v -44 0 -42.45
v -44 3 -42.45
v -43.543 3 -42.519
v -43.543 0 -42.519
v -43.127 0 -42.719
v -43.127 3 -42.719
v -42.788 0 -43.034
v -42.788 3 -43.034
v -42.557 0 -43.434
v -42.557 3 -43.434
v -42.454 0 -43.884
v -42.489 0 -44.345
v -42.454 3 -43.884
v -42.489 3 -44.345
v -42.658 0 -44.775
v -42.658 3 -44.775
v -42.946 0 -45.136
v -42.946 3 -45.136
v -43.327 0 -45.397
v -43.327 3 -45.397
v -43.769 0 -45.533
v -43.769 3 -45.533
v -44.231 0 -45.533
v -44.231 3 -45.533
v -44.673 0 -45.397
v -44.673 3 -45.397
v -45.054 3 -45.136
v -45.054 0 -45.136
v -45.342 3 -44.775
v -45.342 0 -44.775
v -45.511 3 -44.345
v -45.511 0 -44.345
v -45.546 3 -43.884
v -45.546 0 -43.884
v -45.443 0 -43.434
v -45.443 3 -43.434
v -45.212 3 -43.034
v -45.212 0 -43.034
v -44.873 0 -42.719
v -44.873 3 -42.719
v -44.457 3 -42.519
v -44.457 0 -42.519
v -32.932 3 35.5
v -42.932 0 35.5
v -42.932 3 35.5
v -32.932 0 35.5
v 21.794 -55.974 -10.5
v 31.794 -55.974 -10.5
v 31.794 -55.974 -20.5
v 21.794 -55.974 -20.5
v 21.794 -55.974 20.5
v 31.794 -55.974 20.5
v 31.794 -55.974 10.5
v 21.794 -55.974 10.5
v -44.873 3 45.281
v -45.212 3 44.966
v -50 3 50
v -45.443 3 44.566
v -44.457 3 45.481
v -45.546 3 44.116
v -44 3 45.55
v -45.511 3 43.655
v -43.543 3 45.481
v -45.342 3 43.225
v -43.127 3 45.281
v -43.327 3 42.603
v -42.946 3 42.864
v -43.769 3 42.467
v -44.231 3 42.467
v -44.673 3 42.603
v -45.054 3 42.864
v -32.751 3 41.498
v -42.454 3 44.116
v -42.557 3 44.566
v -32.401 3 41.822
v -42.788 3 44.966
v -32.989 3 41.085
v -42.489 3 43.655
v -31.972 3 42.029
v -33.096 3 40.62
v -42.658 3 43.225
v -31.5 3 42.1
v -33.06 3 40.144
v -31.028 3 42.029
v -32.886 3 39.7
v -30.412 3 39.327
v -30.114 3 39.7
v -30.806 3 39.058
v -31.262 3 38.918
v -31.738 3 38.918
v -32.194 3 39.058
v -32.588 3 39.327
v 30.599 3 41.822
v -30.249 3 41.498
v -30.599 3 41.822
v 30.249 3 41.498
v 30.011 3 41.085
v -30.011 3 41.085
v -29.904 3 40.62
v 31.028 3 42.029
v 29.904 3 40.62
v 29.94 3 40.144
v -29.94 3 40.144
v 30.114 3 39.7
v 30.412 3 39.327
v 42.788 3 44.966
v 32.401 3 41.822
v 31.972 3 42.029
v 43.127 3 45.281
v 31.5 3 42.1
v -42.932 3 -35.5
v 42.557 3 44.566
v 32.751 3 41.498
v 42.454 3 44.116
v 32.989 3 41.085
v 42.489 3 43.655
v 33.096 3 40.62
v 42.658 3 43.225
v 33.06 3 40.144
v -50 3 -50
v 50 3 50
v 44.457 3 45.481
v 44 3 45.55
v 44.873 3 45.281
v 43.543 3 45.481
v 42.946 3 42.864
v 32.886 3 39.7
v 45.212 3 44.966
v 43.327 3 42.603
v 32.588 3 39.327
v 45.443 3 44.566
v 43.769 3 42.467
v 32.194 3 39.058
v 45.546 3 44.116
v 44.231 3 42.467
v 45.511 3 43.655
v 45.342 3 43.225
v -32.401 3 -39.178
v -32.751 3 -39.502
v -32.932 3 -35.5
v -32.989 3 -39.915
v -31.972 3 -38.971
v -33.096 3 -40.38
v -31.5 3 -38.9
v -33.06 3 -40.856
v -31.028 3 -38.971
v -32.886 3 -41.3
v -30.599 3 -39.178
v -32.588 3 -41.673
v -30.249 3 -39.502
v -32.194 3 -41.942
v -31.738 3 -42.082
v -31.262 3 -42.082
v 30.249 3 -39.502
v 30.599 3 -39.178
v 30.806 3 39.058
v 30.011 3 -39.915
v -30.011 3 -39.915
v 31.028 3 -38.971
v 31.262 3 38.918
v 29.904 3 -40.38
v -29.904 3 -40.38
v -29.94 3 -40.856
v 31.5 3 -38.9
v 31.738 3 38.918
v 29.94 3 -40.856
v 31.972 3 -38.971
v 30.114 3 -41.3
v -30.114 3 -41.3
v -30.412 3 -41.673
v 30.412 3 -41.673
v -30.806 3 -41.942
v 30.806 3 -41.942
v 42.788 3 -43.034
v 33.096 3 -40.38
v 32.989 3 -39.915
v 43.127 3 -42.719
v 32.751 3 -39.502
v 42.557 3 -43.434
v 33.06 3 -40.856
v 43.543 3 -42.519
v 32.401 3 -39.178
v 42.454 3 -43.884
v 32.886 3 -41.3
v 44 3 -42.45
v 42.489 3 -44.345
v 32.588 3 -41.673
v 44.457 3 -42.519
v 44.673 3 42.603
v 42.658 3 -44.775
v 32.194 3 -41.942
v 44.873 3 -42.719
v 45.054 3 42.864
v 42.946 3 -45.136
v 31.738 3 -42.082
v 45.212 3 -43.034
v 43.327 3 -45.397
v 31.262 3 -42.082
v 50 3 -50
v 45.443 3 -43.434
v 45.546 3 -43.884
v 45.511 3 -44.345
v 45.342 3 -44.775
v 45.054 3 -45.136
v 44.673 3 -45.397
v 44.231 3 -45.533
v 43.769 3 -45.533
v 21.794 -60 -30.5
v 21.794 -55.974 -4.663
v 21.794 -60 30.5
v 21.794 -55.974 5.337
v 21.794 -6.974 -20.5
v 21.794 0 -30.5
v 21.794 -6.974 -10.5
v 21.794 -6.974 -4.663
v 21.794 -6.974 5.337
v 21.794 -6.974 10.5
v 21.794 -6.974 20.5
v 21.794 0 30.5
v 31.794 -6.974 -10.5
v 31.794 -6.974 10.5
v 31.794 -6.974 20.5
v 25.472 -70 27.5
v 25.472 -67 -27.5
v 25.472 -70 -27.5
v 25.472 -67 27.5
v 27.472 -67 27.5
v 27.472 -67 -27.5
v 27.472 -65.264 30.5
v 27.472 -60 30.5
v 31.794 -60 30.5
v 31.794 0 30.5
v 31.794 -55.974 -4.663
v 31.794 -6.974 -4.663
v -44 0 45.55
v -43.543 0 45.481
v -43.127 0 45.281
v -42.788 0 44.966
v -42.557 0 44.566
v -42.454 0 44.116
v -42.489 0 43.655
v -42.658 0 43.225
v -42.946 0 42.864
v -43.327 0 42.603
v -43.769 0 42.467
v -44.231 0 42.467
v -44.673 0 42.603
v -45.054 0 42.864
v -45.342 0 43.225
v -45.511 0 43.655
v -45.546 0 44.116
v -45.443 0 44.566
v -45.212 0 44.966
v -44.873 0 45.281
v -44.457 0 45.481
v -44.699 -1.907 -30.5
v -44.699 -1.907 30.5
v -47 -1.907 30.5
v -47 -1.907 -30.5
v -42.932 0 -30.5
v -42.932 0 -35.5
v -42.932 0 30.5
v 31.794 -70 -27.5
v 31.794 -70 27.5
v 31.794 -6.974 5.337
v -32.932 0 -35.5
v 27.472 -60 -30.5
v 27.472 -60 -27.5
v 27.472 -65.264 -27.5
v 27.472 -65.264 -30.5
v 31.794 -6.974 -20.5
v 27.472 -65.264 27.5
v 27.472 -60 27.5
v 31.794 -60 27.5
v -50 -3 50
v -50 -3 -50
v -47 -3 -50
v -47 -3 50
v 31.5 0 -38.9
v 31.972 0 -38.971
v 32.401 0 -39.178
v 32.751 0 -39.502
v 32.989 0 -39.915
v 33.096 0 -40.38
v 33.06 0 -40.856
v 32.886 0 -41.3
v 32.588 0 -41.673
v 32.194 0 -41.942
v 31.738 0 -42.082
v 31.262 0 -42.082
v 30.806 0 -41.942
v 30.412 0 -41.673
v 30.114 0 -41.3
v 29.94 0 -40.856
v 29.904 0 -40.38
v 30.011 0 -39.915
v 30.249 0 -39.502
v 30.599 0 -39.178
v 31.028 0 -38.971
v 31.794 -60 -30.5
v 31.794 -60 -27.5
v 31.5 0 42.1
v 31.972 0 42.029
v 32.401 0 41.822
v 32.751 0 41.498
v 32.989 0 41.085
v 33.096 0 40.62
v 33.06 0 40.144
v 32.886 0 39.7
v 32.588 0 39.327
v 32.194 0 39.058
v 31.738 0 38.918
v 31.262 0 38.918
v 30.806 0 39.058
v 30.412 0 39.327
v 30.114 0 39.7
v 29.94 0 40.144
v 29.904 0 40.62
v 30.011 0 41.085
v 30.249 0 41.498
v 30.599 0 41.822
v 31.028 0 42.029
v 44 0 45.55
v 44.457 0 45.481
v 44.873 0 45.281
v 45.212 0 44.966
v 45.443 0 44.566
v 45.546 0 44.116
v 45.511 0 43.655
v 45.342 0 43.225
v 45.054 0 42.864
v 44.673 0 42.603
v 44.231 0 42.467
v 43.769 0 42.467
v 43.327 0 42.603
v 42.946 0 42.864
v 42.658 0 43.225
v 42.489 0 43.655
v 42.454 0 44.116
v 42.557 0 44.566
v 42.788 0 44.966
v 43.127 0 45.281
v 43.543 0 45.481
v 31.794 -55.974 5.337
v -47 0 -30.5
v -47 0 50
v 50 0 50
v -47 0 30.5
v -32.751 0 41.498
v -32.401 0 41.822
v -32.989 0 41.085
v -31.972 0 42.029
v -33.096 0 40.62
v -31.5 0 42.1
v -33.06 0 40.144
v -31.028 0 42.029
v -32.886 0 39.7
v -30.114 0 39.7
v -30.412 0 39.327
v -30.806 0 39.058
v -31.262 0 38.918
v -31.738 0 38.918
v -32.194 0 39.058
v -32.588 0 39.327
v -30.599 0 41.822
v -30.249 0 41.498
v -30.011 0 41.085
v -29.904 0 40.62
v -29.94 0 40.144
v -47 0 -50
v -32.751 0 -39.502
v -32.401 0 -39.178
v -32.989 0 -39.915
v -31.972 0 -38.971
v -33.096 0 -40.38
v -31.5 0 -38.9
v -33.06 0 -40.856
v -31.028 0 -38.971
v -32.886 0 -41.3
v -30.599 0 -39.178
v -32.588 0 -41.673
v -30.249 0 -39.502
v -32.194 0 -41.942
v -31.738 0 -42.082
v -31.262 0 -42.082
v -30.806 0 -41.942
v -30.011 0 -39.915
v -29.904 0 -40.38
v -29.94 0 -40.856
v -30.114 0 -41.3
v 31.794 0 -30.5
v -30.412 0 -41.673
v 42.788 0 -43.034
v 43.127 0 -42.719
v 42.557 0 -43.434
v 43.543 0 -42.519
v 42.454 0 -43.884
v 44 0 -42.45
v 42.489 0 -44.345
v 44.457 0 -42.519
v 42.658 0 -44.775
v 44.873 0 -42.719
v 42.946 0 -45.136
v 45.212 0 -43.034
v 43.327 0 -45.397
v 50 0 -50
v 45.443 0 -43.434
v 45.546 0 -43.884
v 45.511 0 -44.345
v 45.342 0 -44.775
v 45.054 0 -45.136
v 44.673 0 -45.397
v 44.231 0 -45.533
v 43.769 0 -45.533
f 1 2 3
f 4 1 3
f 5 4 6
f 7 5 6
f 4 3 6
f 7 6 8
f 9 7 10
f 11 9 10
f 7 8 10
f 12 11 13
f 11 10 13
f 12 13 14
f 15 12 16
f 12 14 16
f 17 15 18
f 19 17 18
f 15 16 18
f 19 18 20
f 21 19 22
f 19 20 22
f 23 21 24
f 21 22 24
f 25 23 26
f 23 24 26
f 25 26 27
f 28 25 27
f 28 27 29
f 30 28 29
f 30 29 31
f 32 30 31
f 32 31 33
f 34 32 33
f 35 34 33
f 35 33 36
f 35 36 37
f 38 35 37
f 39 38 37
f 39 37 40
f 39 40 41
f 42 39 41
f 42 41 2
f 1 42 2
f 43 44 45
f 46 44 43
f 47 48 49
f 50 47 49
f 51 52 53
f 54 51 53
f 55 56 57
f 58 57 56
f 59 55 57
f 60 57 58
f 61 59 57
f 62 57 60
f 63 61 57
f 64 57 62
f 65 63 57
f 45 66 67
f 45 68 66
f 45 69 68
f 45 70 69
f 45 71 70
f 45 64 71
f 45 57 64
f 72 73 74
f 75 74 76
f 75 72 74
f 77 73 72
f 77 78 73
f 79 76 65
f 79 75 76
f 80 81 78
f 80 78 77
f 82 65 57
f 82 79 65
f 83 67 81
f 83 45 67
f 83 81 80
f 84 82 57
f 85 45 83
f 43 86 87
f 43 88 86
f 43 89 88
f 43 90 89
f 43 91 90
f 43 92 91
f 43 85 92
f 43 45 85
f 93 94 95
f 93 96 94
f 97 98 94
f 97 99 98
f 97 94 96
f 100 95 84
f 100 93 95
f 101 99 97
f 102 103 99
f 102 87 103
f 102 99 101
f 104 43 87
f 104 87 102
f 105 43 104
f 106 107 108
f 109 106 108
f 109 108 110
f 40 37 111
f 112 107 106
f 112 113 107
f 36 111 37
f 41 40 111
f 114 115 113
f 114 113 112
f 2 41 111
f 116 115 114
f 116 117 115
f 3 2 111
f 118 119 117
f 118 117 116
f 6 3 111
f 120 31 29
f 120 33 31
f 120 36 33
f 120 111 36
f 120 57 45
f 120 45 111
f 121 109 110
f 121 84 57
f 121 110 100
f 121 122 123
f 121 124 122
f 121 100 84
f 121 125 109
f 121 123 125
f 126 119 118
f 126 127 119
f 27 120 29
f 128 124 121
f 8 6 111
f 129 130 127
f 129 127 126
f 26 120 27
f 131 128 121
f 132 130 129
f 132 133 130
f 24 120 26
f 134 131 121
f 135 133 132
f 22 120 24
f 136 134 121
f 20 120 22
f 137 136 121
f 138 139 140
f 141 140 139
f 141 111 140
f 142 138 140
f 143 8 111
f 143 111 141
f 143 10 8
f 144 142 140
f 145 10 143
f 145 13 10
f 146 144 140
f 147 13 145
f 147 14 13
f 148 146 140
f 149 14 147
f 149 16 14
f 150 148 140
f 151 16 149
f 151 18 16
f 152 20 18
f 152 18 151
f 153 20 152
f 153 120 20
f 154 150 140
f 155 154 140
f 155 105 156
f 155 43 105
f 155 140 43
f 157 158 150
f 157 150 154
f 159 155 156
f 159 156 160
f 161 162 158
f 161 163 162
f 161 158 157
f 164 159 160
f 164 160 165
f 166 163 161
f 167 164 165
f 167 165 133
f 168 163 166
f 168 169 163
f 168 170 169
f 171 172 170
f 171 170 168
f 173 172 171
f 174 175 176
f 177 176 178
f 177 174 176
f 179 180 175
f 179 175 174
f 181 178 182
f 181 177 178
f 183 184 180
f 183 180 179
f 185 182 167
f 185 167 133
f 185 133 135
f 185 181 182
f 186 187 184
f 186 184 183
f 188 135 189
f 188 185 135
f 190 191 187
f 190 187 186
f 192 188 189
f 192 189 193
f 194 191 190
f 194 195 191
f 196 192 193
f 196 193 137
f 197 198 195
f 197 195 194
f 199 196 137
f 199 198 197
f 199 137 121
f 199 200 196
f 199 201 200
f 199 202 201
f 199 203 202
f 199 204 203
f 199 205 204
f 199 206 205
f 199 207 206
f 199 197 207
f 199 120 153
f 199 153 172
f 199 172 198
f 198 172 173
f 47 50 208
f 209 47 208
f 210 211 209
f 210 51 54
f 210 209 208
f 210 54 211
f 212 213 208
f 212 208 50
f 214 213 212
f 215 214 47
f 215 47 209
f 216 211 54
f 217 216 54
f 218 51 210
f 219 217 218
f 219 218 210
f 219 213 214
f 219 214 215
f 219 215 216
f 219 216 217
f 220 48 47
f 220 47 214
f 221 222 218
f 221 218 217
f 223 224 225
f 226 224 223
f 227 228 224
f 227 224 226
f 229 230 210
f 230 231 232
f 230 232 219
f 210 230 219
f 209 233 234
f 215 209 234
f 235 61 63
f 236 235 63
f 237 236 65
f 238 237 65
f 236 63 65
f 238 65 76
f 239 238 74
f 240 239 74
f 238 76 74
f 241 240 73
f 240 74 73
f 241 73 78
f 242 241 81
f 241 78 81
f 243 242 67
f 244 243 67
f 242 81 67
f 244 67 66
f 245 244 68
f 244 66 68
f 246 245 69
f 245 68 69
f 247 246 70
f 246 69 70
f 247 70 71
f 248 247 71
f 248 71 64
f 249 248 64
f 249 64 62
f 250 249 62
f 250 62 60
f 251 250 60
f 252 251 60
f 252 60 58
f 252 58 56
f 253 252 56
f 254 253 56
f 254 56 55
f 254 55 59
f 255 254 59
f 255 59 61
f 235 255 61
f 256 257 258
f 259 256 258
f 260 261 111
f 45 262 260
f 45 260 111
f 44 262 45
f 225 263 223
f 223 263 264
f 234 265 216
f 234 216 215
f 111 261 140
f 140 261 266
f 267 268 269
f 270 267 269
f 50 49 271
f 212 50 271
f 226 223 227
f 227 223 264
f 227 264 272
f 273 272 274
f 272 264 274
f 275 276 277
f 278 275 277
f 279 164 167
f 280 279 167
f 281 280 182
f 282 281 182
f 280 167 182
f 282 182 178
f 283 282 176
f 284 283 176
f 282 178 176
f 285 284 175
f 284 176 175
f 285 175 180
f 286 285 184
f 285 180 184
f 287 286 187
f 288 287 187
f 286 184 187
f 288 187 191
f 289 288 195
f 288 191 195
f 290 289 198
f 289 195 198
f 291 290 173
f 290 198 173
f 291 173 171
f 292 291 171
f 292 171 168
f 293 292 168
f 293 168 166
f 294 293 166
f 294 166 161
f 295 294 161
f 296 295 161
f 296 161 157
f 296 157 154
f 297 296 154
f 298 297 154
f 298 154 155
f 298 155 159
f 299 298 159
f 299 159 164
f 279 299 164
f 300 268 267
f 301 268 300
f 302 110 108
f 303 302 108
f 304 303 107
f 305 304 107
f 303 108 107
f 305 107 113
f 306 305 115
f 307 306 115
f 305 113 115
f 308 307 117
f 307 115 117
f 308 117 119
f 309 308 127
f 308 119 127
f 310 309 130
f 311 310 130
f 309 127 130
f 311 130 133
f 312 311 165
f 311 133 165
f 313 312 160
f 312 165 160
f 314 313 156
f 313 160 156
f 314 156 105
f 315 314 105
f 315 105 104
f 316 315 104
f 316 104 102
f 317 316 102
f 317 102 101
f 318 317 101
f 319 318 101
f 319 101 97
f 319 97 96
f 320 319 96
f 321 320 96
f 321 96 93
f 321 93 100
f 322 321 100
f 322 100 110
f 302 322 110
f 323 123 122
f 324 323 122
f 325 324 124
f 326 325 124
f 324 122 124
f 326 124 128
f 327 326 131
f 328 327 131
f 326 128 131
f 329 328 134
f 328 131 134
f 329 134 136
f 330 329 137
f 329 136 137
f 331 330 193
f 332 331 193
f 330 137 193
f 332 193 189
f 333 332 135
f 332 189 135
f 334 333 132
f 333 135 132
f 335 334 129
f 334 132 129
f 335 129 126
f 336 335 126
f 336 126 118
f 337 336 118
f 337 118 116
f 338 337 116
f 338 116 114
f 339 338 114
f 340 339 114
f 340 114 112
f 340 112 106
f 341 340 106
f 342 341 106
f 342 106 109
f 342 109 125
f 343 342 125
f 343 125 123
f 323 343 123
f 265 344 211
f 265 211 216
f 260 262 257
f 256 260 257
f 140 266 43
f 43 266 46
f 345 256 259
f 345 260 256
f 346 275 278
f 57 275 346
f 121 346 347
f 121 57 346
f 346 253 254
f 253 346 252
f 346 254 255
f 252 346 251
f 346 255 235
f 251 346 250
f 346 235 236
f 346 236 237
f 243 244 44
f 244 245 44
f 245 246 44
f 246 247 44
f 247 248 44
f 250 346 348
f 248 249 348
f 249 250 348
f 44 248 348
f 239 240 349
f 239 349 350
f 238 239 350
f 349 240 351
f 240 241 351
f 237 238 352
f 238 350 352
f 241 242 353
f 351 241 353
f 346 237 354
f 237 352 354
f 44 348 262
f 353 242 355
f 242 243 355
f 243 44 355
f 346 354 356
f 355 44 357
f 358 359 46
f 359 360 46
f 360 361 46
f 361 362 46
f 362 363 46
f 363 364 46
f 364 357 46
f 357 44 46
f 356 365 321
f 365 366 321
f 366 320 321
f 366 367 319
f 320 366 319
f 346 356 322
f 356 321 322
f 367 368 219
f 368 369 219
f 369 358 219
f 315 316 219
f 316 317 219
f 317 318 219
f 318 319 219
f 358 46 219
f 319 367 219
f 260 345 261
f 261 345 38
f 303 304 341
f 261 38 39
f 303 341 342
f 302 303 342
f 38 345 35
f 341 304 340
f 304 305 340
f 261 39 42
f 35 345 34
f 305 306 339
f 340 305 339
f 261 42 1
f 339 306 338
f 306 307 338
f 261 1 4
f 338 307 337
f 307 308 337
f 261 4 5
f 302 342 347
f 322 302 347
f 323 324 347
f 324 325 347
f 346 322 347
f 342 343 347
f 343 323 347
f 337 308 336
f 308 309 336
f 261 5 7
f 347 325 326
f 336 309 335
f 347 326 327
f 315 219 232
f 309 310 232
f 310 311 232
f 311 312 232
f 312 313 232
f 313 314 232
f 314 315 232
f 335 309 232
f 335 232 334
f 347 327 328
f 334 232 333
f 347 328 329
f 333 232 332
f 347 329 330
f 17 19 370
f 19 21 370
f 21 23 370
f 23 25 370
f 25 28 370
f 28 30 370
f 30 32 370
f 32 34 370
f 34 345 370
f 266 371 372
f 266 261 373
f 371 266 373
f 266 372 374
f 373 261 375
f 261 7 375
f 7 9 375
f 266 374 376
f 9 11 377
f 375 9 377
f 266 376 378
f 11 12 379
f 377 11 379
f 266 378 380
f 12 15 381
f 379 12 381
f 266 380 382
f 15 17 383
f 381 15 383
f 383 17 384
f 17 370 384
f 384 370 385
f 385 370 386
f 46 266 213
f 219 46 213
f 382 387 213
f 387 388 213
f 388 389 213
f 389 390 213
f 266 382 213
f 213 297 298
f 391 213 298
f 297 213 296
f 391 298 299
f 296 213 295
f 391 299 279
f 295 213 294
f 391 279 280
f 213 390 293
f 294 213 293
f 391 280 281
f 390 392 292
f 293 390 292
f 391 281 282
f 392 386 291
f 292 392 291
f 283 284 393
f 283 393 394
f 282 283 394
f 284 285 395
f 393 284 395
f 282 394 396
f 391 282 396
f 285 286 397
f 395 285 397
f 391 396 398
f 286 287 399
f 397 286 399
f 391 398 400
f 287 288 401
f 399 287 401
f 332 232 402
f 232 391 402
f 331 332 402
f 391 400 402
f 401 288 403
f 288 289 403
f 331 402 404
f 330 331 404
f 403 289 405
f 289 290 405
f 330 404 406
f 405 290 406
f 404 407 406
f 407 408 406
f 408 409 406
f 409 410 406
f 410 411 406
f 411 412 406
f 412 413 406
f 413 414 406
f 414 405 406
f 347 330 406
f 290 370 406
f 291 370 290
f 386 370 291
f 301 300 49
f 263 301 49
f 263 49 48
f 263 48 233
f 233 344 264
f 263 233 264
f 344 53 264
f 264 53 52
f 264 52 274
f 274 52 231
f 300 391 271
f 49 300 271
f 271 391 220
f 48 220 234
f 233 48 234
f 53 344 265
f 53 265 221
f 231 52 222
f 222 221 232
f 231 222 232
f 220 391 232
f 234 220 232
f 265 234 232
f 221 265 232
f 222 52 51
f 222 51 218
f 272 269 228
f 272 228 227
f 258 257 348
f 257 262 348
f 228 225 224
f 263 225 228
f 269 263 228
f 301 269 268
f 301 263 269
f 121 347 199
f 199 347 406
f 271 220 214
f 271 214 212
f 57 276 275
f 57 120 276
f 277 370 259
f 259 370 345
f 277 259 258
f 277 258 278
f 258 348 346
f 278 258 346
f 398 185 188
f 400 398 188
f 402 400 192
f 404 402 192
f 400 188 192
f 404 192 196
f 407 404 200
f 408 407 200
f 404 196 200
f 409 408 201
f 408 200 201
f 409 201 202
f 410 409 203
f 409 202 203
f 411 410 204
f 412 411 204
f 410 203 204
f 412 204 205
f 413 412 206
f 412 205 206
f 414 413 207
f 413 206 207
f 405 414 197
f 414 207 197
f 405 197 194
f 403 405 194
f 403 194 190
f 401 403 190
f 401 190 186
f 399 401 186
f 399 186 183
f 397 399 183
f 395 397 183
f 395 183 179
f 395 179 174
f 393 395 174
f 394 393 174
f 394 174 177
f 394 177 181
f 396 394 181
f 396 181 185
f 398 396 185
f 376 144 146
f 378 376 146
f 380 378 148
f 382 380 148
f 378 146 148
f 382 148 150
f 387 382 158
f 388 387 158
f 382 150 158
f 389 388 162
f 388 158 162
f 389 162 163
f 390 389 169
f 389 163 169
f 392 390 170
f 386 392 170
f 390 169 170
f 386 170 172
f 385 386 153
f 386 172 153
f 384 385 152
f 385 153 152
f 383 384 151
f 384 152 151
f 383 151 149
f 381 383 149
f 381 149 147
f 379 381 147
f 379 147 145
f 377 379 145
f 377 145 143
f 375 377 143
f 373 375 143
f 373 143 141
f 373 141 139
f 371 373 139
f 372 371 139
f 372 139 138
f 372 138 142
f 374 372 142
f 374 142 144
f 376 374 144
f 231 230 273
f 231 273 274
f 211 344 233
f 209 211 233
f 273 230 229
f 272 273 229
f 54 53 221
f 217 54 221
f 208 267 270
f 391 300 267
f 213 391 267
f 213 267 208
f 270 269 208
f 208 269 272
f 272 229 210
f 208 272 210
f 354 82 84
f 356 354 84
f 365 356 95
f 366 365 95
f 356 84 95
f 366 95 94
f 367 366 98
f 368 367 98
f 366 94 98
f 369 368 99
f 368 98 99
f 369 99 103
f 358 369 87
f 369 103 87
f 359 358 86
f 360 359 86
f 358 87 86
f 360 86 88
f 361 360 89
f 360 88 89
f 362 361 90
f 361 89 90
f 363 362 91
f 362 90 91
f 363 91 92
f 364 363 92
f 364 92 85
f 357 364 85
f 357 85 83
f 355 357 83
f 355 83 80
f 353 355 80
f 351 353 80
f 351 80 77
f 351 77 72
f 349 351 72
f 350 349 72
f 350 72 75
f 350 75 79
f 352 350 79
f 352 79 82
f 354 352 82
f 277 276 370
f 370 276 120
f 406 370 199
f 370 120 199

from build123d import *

# Parameters (mm, degrees)
CROQUIS1_W              = 100
CROQUIS1_H              = 100
SALIENTE_EXTRUIR1_DEPTH = 3
CROQUIS6_R              = 1.55
CORTAR_EXTRUIR4_DEPTH   = 10
CROQUIS7_R              = 1.6
CORTAR_EXTRUIR5_DEPTH   = 10
CROQUIS8_W              = 3
CROQUIS8_H              = 100
SALIENTE_EXTRUIR3_DEPTH = 3
CROQUIS9_W              = 10
CROQUIS9_H              = 61
SALIENTE_EXTRUIR4_DEPTH = 60
CROQUIS10_W             = 4.321859215
CROQUIS10_H             = 55
SALIENTE_EXTRUIR5_DEPTH = 10
CROQUIS11_W             = 55
CROQUIS11_H             = 3
SALIENTE_EXTRUIR6_DEPTH = 2
SALIENTE_EXTRUIR7_DEPTH = 61
CROQUIS13_W             = 10
CROQUIS13_H             = 71
CORTAR_EXTRUIR6_DEPTH   = 61
CROQUIS14_W             = 10
CROQUIS14_H             = 49
CORTAR_EXTRUIR7_DEPTH   = 61


with BuildPart() as part:
    # Croquis1 → Saliente-Extruir1 (new body)
    with BuildSketch(Plane(origin=(0, 0, 0), x_dir=(1, 0, 0), z_dir=(0, 1, 0))):
        Rectangle(CROQUIS1_W, CROQUIS1_H)
    extrude(amount=SALIENTE_EXTRUIR1_DEPTH)

    # Croquis6 → Cortar-Extruir4 (cut)
    with BuildSketch(Plane(origin=(0, 3, 0), x_dir=(1, 0, 0), z_dir=(0, 1, 0))):
        with Locations(Location((-44, 44, 0), (0, 0, 270))):  # turned: the seam where the file's is
            Circle(CROQUIS6_R)
        with Locations(Location((44, 44, 0), (0, 0, 270))):  # turned: the seam where the file's is
            Circle(CROQUIS6_R)
        with Locations(Location((44, -44, 0), (0, 0, 270))):  # turned: the seam where the file's is
            Circle(CROQUIS6_R)
        with Locations(Location((-44, -44, 0), (0, 0, 270))):  # turned: the seam where the file's is
            Circle(CROQUIS6_R)
    extrude(amount=-CORTAR_EXTRUIR4_DEPTH, mode=Mode.SUBTRACT)

    # Croquis7 → Cortar-Extruir5 (cut)
    with BuildSketch(Plane(origin=(0, 3, 0), x_dir=(1, 0, 0), z_dir=(0, 1, 0))):
        with Locations(Location((-31.5, 40.5, 0), (0, 0, 270))):  # turned: the seam where the file's is
            Circle(CROQUIS7_R)
        with Locations(Location((31.5, 40.5, 0), (0, 0, 270))):  # turned: the seam where the file's is
            Circle(CROQUIS7_R)
        with Locations(Location((-31.5, -40.5, 0), (0, 0, 270))):  # turned: the seam where the file's is
            Circle(CROQUIS7_R)
        with Locations(Location((31.5, -40.5, 0), (0, 0, 270))):  # turned: the seam where the file's is
            Circle(CROQUIS7_R)
    extrude(amount=-CORTAR_EXTRUIR5_DEPTH, mode=Mode.SUBTRACT)

    # Croquis8 → Saliente-Extruir3 (add)
    with BuildSketch(Plane.XZ):
        with Locations((-48.5, 0)):
            Rectangle(CROQUIS8_W, CROQUIS8_H)
    extrude(amount=SALIENTE_EXTRUIR3_DEPTH)

    # Croquis9 → Saliente-Extruir4 (add)
    with BuildSketch(Plane.XZ):
        with Locations((26.793549779, 0)):
            Rectangle(CROQUIS9_W, CROQUIS9_H)
    extrude(amount=SALIENTE_EXTRUIR4_DEPTH)

    # Croquis10 → Saliente-Extruir5 (add)
    with BuildSketch(Plane.XZ.offset(60)):
        with Locations((29.632620172, 0)):
            Rectangle(CROQUIS10_W, CROQUIS10_H)
    extrude(amount=SALIENTE_EXTRUIR5_DEPTH)

    # Croquis11 → Saliente-Extruir6 (add)
    with BuildSketch(Plane.ZY.offset(-27.471690564)):
        with Locations((0, -68.5)):
            Rectangle(CROQUIS11_W, CROQUIS11_H)
    extrude(amount=SALIENTE_EXTRUIR6_DEPTH)

    # Croquis12 → Saliente-Extruir7 (add)
    with BuildSketch(Plane.XY.offset(30.5)):
        Polygon((21.793549779, -60), (27.471690564, -60), (27.471690564, -65.263594713), align=None)
        Polygon((-44.699438936, -1.906763457), (-47, -1.906763457), (-47, 0), (-42.931883245, 0), align=None)
    extrude(amount=-SALIENTE_EXTRUIR7_DEPTH)

    # Croquis13 → Cortar-Extruir6 (cut)
    with BuildSketch(Plane.XZ):
        with Locations((-37.931883245, 0)):
            Rectangle(CROQUIS13_W, CROQUIS13_H)
    extrude(amount=-CORTAR_EXTRUIR6_DEPTH, mode=Mode.SUBTRACT)

    # Croquis14 → Cortar-Extruir7 (cut)
    with BuildSketch(Plane(origin=(31.793549779, 0, 0), x_dir=(0, 0, -1), z_dir=(1, 0, 0))):
        with Locations((-15.5, -31.474245952)):
            Rectangle(CROQUIS14_W, CROQUIS14_H)
        with Locations((-0.336542235, -31.474245952)):
            Rectangle(CROQUIS14_W, CROQUIS14_H)
        with Locations((15.5, -31.474245952)):
            Rectangle(CROQUIS14_W, CROQUIS14_H)
    extrude(amount=-CORTAR_EXTRUIR7_DEPTH, mode=Mode.SUBTRACT)


solid = part.part
